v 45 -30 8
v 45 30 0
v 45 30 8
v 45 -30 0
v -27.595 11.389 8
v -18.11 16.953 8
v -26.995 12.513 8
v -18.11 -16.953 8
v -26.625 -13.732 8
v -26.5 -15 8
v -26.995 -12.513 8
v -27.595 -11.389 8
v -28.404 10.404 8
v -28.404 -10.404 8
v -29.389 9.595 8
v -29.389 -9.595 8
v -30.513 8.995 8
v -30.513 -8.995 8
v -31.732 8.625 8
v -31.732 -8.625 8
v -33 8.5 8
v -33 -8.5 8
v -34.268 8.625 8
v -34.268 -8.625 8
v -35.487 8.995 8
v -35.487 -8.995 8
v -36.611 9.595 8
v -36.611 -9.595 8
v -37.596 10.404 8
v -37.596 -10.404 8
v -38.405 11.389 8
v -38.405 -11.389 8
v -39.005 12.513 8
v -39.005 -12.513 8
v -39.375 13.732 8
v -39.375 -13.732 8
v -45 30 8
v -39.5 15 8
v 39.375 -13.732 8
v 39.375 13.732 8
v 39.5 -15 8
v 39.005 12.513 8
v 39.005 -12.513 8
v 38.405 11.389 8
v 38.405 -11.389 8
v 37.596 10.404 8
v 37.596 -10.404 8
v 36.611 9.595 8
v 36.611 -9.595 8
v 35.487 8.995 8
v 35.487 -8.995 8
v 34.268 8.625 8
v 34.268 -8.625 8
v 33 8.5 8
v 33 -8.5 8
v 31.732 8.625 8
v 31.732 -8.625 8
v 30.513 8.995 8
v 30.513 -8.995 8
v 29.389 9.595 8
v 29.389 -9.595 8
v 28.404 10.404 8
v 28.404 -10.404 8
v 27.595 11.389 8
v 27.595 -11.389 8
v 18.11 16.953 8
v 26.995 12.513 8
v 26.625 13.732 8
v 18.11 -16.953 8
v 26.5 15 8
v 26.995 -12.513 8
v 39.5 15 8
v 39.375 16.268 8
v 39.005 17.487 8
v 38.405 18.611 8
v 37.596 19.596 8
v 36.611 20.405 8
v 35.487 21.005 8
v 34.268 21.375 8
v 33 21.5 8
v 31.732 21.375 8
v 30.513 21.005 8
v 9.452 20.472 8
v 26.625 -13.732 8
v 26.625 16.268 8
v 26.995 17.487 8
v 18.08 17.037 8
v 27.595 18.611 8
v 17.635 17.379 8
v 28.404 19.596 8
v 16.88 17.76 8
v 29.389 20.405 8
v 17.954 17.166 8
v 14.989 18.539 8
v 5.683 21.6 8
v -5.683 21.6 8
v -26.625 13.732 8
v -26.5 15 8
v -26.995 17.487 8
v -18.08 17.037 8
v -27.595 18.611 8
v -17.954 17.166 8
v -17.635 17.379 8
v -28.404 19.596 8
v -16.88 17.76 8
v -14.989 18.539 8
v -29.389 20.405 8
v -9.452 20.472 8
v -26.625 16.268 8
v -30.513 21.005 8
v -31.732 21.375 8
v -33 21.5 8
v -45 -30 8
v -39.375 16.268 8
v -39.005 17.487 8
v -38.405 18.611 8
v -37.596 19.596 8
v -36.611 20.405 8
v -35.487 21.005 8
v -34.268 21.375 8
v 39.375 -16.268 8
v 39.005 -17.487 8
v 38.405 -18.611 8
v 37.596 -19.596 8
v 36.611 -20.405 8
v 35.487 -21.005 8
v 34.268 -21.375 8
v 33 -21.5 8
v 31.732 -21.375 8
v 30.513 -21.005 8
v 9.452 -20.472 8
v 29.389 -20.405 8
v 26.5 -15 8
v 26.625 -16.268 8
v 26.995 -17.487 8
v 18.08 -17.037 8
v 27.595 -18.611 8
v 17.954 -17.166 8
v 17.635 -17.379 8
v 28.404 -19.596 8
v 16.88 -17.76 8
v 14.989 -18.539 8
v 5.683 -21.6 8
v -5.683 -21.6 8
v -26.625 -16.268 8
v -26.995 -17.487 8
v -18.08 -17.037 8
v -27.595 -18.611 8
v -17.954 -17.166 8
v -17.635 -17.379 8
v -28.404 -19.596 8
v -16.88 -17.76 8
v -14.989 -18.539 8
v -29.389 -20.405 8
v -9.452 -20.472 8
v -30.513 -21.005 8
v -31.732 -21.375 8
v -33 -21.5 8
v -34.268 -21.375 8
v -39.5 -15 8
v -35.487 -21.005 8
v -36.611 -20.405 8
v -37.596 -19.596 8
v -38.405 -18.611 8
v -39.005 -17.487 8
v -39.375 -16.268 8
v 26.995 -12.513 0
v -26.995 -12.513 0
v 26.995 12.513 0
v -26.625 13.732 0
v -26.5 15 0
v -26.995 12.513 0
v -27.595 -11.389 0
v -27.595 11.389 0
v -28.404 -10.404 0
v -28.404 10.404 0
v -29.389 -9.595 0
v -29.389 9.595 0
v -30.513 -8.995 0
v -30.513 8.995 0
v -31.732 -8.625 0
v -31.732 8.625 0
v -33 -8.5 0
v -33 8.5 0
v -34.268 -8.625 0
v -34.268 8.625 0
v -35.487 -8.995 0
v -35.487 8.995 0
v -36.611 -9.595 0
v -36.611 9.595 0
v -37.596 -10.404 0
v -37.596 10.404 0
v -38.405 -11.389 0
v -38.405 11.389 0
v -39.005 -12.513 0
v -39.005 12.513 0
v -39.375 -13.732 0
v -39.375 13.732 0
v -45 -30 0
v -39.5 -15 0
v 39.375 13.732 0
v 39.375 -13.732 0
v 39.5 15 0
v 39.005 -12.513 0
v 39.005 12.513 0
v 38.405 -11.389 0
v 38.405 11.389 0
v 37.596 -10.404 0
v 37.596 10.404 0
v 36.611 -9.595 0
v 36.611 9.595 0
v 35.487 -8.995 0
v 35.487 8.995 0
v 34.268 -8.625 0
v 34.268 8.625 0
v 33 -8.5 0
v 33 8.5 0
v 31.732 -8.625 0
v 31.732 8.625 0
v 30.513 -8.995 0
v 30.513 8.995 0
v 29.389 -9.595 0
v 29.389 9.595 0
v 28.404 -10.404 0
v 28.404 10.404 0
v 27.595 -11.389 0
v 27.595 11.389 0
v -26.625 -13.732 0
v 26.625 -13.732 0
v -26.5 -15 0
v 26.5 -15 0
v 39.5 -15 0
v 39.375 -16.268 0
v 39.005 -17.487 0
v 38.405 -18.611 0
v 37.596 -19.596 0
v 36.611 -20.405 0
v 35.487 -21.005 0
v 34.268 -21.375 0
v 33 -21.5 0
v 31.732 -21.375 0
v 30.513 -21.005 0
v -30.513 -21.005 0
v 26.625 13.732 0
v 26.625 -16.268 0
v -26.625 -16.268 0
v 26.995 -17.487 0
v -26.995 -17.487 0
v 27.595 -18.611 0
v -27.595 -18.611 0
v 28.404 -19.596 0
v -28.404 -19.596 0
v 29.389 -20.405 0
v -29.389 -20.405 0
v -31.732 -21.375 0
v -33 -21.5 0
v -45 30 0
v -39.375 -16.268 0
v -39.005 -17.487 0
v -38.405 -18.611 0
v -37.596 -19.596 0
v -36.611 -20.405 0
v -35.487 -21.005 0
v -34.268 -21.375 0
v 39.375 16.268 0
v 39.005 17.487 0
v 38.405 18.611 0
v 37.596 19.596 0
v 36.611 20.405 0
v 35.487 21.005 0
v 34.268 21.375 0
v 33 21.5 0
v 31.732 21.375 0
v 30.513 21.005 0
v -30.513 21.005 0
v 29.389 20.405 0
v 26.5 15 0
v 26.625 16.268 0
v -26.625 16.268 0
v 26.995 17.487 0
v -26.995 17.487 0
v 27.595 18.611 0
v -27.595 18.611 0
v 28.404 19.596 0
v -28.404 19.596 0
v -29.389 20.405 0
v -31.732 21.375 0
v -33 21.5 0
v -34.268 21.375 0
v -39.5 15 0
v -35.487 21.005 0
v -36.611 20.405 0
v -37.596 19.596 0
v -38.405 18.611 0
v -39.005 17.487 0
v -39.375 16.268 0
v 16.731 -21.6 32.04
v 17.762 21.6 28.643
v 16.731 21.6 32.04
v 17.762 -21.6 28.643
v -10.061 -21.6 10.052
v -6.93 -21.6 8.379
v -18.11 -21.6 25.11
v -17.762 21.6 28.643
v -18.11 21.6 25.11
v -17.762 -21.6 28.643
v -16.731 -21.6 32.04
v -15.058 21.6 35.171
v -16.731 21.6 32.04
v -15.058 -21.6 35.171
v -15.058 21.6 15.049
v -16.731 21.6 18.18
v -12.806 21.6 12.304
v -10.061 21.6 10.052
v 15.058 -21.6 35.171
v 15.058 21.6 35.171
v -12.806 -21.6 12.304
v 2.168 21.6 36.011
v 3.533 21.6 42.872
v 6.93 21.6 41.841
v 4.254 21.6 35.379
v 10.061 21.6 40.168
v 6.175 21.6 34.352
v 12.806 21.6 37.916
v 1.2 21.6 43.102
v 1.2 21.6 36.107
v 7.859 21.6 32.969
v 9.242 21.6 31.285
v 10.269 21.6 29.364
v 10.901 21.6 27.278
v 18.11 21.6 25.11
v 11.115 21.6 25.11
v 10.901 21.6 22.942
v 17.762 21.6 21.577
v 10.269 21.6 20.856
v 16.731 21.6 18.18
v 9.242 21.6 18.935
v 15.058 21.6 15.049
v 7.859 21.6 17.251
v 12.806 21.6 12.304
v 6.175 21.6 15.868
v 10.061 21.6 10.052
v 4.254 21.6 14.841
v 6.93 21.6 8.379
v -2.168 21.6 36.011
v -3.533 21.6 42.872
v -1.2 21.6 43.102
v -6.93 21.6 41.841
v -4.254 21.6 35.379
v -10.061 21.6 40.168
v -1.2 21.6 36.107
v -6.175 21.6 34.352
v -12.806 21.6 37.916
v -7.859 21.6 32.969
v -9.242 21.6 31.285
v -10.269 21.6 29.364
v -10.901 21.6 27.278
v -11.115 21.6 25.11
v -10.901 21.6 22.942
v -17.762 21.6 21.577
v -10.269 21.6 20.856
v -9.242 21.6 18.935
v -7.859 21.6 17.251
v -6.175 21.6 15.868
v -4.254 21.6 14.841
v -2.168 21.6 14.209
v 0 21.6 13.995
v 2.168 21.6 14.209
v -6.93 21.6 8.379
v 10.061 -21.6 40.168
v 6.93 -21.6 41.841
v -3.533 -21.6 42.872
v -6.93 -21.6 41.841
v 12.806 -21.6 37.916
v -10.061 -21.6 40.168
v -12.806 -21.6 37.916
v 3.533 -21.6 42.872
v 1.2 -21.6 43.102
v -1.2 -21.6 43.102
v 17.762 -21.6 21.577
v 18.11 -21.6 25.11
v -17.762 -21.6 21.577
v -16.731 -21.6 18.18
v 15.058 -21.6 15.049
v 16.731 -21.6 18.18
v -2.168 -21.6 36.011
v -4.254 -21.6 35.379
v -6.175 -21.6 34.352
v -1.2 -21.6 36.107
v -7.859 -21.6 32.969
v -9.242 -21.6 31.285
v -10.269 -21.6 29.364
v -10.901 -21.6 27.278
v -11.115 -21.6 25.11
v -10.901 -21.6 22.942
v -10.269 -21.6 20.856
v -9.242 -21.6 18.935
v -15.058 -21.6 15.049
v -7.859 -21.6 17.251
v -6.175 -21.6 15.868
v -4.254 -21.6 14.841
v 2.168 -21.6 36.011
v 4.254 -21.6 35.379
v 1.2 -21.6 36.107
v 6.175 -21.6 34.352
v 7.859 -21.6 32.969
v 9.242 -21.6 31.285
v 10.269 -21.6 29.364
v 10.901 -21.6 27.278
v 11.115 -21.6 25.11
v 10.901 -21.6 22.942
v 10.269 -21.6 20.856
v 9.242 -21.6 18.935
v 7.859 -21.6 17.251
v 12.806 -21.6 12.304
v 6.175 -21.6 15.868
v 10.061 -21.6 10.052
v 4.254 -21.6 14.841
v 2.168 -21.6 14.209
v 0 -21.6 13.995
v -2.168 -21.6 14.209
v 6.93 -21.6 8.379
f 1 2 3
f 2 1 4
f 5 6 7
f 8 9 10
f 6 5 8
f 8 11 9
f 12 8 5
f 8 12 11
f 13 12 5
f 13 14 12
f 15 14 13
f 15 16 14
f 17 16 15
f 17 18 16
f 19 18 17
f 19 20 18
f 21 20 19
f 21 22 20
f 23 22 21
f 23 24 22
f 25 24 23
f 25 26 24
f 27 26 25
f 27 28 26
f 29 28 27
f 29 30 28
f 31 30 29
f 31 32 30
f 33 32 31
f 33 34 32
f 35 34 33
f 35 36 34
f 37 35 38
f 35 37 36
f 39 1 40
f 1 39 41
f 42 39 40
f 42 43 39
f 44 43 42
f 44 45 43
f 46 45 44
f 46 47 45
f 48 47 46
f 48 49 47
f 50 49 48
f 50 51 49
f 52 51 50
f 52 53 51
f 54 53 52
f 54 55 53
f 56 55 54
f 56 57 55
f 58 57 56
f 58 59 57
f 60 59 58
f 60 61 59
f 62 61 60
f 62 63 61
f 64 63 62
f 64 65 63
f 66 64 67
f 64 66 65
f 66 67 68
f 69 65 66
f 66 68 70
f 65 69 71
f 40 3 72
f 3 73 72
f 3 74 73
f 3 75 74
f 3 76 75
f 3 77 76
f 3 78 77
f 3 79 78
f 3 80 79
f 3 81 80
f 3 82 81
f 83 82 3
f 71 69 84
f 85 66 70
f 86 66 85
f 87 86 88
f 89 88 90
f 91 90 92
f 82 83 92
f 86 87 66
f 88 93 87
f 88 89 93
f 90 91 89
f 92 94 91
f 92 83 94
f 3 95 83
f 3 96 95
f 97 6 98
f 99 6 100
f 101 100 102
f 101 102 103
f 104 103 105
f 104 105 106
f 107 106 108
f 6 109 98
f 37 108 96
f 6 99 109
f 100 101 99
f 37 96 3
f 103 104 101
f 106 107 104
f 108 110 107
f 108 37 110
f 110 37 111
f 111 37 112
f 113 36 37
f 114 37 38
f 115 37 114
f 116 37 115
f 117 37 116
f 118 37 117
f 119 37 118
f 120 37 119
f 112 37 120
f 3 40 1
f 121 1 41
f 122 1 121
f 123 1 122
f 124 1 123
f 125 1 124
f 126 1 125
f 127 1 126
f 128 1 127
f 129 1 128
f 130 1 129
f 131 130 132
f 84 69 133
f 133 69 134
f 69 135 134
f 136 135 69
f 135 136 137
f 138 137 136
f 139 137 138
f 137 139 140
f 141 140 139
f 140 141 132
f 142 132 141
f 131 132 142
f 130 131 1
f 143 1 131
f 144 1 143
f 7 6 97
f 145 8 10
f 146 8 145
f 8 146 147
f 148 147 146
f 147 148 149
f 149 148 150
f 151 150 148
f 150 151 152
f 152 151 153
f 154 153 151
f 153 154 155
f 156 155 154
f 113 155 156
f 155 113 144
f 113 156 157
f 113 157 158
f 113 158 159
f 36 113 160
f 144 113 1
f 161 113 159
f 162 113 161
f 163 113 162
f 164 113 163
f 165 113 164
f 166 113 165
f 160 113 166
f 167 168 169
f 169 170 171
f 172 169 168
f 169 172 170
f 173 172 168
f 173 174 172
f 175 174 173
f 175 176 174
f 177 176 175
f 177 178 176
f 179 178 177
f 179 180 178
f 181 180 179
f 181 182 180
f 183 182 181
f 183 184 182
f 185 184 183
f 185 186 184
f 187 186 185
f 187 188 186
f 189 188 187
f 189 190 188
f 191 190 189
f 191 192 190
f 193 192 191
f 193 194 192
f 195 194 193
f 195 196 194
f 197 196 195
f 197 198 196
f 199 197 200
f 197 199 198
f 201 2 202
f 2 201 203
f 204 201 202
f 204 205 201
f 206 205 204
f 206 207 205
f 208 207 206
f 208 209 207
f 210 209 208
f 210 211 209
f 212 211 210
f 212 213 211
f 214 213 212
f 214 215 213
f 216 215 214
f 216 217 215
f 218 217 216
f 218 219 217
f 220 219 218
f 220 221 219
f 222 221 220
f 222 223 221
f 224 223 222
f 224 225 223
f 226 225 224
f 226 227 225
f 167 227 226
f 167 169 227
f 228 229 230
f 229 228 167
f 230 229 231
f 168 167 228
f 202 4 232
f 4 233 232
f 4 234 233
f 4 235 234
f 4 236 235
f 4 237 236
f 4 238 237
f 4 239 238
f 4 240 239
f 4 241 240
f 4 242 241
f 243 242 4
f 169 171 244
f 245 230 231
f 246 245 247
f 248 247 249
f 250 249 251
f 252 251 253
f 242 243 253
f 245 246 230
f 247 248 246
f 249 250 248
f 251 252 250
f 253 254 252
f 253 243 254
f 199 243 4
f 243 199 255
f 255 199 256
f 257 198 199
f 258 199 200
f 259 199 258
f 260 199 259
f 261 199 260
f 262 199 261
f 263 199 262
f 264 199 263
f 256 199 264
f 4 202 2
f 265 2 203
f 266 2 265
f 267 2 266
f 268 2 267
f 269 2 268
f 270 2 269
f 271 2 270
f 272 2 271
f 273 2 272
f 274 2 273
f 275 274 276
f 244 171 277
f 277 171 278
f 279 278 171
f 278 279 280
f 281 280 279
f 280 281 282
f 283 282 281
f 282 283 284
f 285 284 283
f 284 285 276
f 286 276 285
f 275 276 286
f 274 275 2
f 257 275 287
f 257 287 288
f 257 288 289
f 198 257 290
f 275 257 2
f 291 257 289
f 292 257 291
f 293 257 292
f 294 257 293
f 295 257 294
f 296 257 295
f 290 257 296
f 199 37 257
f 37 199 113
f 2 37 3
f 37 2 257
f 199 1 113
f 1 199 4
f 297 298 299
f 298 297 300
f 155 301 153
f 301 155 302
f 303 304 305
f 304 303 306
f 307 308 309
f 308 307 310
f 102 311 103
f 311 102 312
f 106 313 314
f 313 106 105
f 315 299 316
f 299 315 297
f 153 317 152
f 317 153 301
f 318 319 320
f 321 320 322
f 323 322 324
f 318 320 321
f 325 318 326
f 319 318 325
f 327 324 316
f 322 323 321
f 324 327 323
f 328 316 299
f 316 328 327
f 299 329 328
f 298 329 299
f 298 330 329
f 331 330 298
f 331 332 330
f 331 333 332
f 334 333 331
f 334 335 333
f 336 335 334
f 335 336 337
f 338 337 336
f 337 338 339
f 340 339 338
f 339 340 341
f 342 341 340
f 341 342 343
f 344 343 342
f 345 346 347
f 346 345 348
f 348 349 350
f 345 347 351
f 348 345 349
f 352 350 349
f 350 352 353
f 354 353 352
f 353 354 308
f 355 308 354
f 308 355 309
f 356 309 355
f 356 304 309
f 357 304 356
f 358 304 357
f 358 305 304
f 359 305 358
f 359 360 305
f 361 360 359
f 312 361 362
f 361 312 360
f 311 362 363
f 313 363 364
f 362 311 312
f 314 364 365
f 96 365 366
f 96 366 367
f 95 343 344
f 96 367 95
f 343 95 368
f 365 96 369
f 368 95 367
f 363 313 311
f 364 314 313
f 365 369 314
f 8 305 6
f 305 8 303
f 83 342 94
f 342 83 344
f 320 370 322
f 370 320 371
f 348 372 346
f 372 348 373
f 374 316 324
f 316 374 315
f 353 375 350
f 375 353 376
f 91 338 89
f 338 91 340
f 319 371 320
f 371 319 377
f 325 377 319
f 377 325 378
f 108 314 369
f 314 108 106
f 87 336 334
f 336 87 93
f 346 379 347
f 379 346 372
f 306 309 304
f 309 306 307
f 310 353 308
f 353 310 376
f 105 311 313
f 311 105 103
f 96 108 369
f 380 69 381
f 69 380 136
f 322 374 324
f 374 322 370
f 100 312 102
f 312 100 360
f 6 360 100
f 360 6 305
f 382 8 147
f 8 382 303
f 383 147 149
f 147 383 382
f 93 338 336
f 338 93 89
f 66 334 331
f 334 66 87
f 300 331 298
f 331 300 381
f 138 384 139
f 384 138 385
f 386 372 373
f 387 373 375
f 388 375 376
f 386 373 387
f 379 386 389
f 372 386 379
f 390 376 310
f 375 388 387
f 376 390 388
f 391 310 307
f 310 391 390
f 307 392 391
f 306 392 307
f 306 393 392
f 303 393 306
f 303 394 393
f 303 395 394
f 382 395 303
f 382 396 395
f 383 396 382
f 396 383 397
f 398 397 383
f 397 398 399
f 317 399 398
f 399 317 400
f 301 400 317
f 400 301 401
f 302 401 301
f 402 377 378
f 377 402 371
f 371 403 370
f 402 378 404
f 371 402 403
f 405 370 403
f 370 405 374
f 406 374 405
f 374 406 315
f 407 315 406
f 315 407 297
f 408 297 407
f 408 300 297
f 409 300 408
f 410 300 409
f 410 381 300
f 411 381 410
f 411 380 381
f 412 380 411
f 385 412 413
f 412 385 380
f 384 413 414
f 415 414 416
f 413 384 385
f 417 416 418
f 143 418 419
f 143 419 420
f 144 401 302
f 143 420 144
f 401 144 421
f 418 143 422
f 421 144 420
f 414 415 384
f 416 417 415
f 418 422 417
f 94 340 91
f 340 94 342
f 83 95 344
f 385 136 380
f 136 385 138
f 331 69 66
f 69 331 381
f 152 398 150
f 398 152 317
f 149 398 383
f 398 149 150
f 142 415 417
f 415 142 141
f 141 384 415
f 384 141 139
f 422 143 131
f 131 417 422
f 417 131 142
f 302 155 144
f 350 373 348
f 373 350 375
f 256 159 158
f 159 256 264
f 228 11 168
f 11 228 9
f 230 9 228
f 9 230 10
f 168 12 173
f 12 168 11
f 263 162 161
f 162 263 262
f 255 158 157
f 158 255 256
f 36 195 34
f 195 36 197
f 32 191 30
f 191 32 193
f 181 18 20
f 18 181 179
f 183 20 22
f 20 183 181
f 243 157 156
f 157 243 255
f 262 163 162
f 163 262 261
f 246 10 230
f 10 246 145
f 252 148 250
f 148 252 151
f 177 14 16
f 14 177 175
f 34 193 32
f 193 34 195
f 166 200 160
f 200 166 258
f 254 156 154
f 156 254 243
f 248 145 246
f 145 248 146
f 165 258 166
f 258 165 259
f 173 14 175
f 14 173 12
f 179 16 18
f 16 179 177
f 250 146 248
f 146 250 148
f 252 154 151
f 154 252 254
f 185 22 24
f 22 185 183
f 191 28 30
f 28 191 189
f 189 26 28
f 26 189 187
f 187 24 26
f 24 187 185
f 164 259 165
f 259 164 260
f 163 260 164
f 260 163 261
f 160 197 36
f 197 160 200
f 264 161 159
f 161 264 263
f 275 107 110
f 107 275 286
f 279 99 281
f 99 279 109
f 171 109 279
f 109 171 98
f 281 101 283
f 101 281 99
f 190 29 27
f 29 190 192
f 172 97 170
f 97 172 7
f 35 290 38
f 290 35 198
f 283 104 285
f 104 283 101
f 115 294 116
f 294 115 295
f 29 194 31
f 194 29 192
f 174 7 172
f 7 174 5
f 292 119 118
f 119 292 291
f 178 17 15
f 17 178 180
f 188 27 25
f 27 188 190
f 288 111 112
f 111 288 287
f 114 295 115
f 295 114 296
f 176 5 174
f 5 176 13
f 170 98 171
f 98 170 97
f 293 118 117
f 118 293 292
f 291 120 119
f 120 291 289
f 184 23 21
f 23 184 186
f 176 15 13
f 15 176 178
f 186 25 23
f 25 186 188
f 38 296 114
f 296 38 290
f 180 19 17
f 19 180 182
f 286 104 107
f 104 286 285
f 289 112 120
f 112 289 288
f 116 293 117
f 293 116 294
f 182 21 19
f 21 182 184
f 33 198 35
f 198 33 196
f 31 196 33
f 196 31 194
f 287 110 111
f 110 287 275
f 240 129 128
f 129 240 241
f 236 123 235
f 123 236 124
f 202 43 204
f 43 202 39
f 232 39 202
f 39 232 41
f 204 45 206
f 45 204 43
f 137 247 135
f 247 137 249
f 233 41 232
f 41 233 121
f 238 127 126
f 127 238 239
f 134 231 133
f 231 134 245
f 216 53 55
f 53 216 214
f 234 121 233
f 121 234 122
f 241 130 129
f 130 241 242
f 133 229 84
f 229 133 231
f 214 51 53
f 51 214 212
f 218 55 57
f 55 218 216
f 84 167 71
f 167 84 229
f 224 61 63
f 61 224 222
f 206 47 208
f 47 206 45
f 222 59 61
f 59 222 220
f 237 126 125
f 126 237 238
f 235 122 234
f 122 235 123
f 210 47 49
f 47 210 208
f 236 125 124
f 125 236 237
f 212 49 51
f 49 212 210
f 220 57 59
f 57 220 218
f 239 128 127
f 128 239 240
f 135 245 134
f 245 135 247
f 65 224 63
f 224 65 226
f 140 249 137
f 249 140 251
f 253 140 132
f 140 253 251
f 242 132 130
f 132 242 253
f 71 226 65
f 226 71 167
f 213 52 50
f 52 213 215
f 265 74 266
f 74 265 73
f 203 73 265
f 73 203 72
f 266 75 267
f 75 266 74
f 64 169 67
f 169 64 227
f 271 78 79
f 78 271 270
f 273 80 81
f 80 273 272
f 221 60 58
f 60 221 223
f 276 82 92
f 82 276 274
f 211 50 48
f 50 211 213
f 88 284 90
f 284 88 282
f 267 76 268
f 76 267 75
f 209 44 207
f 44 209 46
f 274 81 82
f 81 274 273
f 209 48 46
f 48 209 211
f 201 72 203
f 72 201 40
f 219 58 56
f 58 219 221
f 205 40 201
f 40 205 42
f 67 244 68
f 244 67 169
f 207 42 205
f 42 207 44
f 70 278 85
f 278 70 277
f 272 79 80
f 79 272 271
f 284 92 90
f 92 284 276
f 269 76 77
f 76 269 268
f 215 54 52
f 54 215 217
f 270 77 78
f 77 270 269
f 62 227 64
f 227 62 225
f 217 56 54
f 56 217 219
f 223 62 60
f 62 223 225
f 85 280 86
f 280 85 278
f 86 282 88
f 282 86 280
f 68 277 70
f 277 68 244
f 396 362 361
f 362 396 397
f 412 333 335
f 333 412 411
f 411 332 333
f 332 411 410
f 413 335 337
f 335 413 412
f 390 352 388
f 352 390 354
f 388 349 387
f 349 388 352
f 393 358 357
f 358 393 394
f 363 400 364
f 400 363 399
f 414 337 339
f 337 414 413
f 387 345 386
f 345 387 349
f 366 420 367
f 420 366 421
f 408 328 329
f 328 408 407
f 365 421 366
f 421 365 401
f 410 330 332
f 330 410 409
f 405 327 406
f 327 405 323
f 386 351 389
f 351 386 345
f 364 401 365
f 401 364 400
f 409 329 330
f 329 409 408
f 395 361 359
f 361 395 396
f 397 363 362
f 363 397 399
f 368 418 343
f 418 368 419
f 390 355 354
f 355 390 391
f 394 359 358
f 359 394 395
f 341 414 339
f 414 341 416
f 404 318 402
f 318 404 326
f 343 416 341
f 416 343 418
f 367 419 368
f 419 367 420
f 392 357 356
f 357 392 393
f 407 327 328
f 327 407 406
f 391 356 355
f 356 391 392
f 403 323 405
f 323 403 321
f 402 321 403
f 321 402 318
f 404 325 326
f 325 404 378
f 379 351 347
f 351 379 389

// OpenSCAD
$fn = 32;

// ----------------------------------------------------------------------
// Bearing block: 90 x 60 mm base, 22.23 mm bore at 25.11 mm
// ----------------------------------------------------------------------

// --- parameters (mm) ---
base_w = 90;              // base width
base_d = 60;              // base depth
base_t = 8;               // base thickness
bore_d = 22.23;           // shaft / bearing bore
house_r = 18.11;          // housing outer radius
house_len = 43.2;         // housing length along the shaft
foot_w = 36.22;           // foot width under the housing
foot_len = 33.2;          // foot length along the shaft
axis_z = 25.11;           // bore axis height above the base
holes_d = 13;             // mounting holes
hole_x = 33;              // mounting hole spacing
groove_w = 2.4;           // oil groove width

difference() {
  union() {
    /* base plate with its underside on z = 0 */
    translate([0, 0, base_t / 2]) cube([base_w, base_d, base_t], center = true);
    /* hull foot: a straight web blending into the round housing */
    hull() {
      translate([0, 0, base_t - 0.5]) cube([foot_w, foot_len, 1.6], center = true);
      translate([0, 0, axis_z]) rotate([-90, 0, 0]) cylinder(h = house_len, d = 2 * house_r, center = true);
    }
  }
  /* bore through the housing, 2.5 mm clear on both sides */
  translate([0, 0, axis_z]) rotate([-90, 0, 0]) cylinder(h = house_len + 5, d = bore_d, center = true);
  /* oil groove from the top of the housing into the bore */
  translate([-groove_w / 2, -house_len / 2 - 2.5, axis_z + bore_d * 0.17]) cube([groove_w, house_len + 5, house_r + 5]);
  /* mounting holes through the base plate */
  for (hx = [-33, 33]) {
    for (hy = [-15, 15]) {
      translate([hx, hy, -2.5]) cylinder(h = base_t + 5, d = holes_d);
    }
  }
}
